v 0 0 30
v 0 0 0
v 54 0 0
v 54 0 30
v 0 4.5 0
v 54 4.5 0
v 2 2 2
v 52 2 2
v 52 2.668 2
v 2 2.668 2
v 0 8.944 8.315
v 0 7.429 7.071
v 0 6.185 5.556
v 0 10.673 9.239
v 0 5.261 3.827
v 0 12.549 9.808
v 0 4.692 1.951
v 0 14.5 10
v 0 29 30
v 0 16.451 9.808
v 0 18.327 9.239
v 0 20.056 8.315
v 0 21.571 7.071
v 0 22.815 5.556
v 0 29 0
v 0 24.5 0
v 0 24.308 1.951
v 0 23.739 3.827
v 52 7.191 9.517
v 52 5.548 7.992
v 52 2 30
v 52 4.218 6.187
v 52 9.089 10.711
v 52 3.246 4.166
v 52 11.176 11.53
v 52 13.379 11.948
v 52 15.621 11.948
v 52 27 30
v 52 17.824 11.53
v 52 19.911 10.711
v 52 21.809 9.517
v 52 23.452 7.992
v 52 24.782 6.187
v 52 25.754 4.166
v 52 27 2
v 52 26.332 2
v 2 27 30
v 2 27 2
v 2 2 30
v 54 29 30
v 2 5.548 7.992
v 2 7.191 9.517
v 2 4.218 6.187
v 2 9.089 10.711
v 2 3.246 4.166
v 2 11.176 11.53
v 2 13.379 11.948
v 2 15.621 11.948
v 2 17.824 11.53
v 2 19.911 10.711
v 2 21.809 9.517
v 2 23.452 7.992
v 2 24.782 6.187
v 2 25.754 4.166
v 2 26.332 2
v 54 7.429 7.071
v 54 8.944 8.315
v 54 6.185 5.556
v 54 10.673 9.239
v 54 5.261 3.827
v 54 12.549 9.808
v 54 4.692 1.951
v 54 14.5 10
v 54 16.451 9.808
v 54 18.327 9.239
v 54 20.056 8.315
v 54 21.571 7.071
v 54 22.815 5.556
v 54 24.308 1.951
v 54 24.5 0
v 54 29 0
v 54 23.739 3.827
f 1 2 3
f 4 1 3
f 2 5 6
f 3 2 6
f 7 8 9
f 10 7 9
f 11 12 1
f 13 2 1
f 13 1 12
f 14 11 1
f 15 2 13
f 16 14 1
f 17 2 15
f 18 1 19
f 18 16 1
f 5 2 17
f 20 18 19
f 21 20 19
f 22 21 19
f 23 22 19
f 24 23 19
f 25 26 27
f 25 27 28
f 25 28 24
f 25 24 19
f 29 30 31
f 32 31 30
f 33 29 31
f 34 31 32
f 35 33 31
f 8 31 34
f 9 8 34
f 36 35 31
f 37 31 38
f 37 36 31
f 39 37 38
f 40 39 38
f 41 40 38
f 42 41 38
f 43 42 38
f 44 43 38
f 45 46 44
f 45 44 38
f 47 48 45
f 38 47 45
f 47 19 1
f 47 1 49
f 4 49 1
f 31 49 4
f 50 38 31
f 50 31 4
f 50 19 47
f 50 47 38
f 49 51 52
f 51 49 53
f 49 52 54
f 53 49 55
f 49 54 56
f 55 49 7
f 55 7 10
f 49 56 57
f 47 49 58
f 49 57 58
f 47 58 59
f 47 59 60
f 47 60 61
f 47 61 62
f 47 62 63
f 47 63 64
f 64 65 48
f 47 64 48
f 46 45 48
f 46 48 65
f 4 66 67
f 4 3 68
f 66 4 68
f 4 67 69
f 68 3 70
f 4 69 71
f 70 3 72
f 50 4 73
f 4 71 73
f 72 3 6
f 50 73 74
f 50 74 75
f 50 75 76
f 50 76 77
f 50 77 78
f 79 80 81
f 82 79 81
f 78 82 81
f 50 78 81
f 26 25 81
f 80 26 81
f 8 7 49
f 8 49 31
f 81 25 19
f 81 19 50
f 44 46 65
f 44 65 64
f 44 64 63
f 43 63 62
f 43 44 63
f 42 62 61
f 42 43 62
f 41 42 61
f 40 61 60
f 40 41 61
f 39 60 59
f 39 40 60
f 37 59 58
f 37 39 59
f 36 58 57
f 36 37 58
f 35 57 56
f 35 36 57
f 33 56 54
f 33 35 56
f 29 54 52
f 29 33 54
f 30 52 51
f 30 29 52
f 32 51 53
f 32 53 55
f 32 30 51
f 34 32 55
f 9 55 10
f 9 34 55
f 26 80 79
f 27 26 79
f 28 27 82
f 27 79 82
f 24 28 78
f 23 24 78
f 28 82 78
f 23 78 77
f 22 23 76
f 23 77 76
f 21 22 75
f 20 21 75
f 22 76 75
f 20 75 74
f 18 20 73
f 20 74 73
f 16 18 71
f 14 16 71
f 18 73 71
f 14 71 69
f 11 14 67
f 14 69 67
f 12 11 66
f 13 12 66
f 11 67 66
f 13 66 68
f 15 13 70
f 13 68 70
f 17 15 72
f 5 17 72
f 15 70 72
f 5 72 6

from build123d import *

# Parameters (mm, degrees)
SKETCH_W     = 54
SKETCH_H     = 29
SKETCH_W_2   = 50
SKETCH_H_2   = 25
PAD_DEPTH    = 30
POCKET_DEPTH = 54.001
PAD001_DEPTH = 52


with BuildPart() as part:
    # Sketch → Pad (new body)
    with BuildSketch(Plane.XY):
        with Locations((27, 14.5)):
            Rectangle(SKETCH_W, SKETCH_H)
        with Locations((27, 14.5)):
            Rectangle(SKETCH_W_2, SKETCH_H_2, mode=Mode.SUBTRACT)
    extrude(amount=PAD_DEPTH)

    # Sketch001 (on Face2 of Pad) → Pocket (cut, through all)
    with BuildSketch(Plane.YZ.offset(54)):
        with BuildLine():
            ThreePointArc((24.5, 0), (14.5, 10), (4.5, 0))
            Line((4.5, 0), (24.5, 0))
        make_face()
    extrude(amount=-POCKET_DEPTH, mode=Mode.SUBTRACT)

    # Sketch002 (on Face3 of Pocket) → Pad001 (join)
    with BuildSketch(Plane.YZ.offset(54)):
        with BuildLine():
            ThreePointArc((24.5, 0), (14.5, 10), (4.5, 0))
            Line((0, 0), (4.5, 0))
            Line((0, 0), (0, 2))
            Line((0, 2), (2.66784, 2))
            ThreePointArc((26.33216, 2), (14.5, 12), (2.66784, 2))
            Line((29, 2), (26.33216, 2))
            Line((29, 0), (29, 2))
            Line((24.5, 0), (29, 0))
        make_face()
    extrude(amount=-PAD001_DEPTH)


solid = part.part
